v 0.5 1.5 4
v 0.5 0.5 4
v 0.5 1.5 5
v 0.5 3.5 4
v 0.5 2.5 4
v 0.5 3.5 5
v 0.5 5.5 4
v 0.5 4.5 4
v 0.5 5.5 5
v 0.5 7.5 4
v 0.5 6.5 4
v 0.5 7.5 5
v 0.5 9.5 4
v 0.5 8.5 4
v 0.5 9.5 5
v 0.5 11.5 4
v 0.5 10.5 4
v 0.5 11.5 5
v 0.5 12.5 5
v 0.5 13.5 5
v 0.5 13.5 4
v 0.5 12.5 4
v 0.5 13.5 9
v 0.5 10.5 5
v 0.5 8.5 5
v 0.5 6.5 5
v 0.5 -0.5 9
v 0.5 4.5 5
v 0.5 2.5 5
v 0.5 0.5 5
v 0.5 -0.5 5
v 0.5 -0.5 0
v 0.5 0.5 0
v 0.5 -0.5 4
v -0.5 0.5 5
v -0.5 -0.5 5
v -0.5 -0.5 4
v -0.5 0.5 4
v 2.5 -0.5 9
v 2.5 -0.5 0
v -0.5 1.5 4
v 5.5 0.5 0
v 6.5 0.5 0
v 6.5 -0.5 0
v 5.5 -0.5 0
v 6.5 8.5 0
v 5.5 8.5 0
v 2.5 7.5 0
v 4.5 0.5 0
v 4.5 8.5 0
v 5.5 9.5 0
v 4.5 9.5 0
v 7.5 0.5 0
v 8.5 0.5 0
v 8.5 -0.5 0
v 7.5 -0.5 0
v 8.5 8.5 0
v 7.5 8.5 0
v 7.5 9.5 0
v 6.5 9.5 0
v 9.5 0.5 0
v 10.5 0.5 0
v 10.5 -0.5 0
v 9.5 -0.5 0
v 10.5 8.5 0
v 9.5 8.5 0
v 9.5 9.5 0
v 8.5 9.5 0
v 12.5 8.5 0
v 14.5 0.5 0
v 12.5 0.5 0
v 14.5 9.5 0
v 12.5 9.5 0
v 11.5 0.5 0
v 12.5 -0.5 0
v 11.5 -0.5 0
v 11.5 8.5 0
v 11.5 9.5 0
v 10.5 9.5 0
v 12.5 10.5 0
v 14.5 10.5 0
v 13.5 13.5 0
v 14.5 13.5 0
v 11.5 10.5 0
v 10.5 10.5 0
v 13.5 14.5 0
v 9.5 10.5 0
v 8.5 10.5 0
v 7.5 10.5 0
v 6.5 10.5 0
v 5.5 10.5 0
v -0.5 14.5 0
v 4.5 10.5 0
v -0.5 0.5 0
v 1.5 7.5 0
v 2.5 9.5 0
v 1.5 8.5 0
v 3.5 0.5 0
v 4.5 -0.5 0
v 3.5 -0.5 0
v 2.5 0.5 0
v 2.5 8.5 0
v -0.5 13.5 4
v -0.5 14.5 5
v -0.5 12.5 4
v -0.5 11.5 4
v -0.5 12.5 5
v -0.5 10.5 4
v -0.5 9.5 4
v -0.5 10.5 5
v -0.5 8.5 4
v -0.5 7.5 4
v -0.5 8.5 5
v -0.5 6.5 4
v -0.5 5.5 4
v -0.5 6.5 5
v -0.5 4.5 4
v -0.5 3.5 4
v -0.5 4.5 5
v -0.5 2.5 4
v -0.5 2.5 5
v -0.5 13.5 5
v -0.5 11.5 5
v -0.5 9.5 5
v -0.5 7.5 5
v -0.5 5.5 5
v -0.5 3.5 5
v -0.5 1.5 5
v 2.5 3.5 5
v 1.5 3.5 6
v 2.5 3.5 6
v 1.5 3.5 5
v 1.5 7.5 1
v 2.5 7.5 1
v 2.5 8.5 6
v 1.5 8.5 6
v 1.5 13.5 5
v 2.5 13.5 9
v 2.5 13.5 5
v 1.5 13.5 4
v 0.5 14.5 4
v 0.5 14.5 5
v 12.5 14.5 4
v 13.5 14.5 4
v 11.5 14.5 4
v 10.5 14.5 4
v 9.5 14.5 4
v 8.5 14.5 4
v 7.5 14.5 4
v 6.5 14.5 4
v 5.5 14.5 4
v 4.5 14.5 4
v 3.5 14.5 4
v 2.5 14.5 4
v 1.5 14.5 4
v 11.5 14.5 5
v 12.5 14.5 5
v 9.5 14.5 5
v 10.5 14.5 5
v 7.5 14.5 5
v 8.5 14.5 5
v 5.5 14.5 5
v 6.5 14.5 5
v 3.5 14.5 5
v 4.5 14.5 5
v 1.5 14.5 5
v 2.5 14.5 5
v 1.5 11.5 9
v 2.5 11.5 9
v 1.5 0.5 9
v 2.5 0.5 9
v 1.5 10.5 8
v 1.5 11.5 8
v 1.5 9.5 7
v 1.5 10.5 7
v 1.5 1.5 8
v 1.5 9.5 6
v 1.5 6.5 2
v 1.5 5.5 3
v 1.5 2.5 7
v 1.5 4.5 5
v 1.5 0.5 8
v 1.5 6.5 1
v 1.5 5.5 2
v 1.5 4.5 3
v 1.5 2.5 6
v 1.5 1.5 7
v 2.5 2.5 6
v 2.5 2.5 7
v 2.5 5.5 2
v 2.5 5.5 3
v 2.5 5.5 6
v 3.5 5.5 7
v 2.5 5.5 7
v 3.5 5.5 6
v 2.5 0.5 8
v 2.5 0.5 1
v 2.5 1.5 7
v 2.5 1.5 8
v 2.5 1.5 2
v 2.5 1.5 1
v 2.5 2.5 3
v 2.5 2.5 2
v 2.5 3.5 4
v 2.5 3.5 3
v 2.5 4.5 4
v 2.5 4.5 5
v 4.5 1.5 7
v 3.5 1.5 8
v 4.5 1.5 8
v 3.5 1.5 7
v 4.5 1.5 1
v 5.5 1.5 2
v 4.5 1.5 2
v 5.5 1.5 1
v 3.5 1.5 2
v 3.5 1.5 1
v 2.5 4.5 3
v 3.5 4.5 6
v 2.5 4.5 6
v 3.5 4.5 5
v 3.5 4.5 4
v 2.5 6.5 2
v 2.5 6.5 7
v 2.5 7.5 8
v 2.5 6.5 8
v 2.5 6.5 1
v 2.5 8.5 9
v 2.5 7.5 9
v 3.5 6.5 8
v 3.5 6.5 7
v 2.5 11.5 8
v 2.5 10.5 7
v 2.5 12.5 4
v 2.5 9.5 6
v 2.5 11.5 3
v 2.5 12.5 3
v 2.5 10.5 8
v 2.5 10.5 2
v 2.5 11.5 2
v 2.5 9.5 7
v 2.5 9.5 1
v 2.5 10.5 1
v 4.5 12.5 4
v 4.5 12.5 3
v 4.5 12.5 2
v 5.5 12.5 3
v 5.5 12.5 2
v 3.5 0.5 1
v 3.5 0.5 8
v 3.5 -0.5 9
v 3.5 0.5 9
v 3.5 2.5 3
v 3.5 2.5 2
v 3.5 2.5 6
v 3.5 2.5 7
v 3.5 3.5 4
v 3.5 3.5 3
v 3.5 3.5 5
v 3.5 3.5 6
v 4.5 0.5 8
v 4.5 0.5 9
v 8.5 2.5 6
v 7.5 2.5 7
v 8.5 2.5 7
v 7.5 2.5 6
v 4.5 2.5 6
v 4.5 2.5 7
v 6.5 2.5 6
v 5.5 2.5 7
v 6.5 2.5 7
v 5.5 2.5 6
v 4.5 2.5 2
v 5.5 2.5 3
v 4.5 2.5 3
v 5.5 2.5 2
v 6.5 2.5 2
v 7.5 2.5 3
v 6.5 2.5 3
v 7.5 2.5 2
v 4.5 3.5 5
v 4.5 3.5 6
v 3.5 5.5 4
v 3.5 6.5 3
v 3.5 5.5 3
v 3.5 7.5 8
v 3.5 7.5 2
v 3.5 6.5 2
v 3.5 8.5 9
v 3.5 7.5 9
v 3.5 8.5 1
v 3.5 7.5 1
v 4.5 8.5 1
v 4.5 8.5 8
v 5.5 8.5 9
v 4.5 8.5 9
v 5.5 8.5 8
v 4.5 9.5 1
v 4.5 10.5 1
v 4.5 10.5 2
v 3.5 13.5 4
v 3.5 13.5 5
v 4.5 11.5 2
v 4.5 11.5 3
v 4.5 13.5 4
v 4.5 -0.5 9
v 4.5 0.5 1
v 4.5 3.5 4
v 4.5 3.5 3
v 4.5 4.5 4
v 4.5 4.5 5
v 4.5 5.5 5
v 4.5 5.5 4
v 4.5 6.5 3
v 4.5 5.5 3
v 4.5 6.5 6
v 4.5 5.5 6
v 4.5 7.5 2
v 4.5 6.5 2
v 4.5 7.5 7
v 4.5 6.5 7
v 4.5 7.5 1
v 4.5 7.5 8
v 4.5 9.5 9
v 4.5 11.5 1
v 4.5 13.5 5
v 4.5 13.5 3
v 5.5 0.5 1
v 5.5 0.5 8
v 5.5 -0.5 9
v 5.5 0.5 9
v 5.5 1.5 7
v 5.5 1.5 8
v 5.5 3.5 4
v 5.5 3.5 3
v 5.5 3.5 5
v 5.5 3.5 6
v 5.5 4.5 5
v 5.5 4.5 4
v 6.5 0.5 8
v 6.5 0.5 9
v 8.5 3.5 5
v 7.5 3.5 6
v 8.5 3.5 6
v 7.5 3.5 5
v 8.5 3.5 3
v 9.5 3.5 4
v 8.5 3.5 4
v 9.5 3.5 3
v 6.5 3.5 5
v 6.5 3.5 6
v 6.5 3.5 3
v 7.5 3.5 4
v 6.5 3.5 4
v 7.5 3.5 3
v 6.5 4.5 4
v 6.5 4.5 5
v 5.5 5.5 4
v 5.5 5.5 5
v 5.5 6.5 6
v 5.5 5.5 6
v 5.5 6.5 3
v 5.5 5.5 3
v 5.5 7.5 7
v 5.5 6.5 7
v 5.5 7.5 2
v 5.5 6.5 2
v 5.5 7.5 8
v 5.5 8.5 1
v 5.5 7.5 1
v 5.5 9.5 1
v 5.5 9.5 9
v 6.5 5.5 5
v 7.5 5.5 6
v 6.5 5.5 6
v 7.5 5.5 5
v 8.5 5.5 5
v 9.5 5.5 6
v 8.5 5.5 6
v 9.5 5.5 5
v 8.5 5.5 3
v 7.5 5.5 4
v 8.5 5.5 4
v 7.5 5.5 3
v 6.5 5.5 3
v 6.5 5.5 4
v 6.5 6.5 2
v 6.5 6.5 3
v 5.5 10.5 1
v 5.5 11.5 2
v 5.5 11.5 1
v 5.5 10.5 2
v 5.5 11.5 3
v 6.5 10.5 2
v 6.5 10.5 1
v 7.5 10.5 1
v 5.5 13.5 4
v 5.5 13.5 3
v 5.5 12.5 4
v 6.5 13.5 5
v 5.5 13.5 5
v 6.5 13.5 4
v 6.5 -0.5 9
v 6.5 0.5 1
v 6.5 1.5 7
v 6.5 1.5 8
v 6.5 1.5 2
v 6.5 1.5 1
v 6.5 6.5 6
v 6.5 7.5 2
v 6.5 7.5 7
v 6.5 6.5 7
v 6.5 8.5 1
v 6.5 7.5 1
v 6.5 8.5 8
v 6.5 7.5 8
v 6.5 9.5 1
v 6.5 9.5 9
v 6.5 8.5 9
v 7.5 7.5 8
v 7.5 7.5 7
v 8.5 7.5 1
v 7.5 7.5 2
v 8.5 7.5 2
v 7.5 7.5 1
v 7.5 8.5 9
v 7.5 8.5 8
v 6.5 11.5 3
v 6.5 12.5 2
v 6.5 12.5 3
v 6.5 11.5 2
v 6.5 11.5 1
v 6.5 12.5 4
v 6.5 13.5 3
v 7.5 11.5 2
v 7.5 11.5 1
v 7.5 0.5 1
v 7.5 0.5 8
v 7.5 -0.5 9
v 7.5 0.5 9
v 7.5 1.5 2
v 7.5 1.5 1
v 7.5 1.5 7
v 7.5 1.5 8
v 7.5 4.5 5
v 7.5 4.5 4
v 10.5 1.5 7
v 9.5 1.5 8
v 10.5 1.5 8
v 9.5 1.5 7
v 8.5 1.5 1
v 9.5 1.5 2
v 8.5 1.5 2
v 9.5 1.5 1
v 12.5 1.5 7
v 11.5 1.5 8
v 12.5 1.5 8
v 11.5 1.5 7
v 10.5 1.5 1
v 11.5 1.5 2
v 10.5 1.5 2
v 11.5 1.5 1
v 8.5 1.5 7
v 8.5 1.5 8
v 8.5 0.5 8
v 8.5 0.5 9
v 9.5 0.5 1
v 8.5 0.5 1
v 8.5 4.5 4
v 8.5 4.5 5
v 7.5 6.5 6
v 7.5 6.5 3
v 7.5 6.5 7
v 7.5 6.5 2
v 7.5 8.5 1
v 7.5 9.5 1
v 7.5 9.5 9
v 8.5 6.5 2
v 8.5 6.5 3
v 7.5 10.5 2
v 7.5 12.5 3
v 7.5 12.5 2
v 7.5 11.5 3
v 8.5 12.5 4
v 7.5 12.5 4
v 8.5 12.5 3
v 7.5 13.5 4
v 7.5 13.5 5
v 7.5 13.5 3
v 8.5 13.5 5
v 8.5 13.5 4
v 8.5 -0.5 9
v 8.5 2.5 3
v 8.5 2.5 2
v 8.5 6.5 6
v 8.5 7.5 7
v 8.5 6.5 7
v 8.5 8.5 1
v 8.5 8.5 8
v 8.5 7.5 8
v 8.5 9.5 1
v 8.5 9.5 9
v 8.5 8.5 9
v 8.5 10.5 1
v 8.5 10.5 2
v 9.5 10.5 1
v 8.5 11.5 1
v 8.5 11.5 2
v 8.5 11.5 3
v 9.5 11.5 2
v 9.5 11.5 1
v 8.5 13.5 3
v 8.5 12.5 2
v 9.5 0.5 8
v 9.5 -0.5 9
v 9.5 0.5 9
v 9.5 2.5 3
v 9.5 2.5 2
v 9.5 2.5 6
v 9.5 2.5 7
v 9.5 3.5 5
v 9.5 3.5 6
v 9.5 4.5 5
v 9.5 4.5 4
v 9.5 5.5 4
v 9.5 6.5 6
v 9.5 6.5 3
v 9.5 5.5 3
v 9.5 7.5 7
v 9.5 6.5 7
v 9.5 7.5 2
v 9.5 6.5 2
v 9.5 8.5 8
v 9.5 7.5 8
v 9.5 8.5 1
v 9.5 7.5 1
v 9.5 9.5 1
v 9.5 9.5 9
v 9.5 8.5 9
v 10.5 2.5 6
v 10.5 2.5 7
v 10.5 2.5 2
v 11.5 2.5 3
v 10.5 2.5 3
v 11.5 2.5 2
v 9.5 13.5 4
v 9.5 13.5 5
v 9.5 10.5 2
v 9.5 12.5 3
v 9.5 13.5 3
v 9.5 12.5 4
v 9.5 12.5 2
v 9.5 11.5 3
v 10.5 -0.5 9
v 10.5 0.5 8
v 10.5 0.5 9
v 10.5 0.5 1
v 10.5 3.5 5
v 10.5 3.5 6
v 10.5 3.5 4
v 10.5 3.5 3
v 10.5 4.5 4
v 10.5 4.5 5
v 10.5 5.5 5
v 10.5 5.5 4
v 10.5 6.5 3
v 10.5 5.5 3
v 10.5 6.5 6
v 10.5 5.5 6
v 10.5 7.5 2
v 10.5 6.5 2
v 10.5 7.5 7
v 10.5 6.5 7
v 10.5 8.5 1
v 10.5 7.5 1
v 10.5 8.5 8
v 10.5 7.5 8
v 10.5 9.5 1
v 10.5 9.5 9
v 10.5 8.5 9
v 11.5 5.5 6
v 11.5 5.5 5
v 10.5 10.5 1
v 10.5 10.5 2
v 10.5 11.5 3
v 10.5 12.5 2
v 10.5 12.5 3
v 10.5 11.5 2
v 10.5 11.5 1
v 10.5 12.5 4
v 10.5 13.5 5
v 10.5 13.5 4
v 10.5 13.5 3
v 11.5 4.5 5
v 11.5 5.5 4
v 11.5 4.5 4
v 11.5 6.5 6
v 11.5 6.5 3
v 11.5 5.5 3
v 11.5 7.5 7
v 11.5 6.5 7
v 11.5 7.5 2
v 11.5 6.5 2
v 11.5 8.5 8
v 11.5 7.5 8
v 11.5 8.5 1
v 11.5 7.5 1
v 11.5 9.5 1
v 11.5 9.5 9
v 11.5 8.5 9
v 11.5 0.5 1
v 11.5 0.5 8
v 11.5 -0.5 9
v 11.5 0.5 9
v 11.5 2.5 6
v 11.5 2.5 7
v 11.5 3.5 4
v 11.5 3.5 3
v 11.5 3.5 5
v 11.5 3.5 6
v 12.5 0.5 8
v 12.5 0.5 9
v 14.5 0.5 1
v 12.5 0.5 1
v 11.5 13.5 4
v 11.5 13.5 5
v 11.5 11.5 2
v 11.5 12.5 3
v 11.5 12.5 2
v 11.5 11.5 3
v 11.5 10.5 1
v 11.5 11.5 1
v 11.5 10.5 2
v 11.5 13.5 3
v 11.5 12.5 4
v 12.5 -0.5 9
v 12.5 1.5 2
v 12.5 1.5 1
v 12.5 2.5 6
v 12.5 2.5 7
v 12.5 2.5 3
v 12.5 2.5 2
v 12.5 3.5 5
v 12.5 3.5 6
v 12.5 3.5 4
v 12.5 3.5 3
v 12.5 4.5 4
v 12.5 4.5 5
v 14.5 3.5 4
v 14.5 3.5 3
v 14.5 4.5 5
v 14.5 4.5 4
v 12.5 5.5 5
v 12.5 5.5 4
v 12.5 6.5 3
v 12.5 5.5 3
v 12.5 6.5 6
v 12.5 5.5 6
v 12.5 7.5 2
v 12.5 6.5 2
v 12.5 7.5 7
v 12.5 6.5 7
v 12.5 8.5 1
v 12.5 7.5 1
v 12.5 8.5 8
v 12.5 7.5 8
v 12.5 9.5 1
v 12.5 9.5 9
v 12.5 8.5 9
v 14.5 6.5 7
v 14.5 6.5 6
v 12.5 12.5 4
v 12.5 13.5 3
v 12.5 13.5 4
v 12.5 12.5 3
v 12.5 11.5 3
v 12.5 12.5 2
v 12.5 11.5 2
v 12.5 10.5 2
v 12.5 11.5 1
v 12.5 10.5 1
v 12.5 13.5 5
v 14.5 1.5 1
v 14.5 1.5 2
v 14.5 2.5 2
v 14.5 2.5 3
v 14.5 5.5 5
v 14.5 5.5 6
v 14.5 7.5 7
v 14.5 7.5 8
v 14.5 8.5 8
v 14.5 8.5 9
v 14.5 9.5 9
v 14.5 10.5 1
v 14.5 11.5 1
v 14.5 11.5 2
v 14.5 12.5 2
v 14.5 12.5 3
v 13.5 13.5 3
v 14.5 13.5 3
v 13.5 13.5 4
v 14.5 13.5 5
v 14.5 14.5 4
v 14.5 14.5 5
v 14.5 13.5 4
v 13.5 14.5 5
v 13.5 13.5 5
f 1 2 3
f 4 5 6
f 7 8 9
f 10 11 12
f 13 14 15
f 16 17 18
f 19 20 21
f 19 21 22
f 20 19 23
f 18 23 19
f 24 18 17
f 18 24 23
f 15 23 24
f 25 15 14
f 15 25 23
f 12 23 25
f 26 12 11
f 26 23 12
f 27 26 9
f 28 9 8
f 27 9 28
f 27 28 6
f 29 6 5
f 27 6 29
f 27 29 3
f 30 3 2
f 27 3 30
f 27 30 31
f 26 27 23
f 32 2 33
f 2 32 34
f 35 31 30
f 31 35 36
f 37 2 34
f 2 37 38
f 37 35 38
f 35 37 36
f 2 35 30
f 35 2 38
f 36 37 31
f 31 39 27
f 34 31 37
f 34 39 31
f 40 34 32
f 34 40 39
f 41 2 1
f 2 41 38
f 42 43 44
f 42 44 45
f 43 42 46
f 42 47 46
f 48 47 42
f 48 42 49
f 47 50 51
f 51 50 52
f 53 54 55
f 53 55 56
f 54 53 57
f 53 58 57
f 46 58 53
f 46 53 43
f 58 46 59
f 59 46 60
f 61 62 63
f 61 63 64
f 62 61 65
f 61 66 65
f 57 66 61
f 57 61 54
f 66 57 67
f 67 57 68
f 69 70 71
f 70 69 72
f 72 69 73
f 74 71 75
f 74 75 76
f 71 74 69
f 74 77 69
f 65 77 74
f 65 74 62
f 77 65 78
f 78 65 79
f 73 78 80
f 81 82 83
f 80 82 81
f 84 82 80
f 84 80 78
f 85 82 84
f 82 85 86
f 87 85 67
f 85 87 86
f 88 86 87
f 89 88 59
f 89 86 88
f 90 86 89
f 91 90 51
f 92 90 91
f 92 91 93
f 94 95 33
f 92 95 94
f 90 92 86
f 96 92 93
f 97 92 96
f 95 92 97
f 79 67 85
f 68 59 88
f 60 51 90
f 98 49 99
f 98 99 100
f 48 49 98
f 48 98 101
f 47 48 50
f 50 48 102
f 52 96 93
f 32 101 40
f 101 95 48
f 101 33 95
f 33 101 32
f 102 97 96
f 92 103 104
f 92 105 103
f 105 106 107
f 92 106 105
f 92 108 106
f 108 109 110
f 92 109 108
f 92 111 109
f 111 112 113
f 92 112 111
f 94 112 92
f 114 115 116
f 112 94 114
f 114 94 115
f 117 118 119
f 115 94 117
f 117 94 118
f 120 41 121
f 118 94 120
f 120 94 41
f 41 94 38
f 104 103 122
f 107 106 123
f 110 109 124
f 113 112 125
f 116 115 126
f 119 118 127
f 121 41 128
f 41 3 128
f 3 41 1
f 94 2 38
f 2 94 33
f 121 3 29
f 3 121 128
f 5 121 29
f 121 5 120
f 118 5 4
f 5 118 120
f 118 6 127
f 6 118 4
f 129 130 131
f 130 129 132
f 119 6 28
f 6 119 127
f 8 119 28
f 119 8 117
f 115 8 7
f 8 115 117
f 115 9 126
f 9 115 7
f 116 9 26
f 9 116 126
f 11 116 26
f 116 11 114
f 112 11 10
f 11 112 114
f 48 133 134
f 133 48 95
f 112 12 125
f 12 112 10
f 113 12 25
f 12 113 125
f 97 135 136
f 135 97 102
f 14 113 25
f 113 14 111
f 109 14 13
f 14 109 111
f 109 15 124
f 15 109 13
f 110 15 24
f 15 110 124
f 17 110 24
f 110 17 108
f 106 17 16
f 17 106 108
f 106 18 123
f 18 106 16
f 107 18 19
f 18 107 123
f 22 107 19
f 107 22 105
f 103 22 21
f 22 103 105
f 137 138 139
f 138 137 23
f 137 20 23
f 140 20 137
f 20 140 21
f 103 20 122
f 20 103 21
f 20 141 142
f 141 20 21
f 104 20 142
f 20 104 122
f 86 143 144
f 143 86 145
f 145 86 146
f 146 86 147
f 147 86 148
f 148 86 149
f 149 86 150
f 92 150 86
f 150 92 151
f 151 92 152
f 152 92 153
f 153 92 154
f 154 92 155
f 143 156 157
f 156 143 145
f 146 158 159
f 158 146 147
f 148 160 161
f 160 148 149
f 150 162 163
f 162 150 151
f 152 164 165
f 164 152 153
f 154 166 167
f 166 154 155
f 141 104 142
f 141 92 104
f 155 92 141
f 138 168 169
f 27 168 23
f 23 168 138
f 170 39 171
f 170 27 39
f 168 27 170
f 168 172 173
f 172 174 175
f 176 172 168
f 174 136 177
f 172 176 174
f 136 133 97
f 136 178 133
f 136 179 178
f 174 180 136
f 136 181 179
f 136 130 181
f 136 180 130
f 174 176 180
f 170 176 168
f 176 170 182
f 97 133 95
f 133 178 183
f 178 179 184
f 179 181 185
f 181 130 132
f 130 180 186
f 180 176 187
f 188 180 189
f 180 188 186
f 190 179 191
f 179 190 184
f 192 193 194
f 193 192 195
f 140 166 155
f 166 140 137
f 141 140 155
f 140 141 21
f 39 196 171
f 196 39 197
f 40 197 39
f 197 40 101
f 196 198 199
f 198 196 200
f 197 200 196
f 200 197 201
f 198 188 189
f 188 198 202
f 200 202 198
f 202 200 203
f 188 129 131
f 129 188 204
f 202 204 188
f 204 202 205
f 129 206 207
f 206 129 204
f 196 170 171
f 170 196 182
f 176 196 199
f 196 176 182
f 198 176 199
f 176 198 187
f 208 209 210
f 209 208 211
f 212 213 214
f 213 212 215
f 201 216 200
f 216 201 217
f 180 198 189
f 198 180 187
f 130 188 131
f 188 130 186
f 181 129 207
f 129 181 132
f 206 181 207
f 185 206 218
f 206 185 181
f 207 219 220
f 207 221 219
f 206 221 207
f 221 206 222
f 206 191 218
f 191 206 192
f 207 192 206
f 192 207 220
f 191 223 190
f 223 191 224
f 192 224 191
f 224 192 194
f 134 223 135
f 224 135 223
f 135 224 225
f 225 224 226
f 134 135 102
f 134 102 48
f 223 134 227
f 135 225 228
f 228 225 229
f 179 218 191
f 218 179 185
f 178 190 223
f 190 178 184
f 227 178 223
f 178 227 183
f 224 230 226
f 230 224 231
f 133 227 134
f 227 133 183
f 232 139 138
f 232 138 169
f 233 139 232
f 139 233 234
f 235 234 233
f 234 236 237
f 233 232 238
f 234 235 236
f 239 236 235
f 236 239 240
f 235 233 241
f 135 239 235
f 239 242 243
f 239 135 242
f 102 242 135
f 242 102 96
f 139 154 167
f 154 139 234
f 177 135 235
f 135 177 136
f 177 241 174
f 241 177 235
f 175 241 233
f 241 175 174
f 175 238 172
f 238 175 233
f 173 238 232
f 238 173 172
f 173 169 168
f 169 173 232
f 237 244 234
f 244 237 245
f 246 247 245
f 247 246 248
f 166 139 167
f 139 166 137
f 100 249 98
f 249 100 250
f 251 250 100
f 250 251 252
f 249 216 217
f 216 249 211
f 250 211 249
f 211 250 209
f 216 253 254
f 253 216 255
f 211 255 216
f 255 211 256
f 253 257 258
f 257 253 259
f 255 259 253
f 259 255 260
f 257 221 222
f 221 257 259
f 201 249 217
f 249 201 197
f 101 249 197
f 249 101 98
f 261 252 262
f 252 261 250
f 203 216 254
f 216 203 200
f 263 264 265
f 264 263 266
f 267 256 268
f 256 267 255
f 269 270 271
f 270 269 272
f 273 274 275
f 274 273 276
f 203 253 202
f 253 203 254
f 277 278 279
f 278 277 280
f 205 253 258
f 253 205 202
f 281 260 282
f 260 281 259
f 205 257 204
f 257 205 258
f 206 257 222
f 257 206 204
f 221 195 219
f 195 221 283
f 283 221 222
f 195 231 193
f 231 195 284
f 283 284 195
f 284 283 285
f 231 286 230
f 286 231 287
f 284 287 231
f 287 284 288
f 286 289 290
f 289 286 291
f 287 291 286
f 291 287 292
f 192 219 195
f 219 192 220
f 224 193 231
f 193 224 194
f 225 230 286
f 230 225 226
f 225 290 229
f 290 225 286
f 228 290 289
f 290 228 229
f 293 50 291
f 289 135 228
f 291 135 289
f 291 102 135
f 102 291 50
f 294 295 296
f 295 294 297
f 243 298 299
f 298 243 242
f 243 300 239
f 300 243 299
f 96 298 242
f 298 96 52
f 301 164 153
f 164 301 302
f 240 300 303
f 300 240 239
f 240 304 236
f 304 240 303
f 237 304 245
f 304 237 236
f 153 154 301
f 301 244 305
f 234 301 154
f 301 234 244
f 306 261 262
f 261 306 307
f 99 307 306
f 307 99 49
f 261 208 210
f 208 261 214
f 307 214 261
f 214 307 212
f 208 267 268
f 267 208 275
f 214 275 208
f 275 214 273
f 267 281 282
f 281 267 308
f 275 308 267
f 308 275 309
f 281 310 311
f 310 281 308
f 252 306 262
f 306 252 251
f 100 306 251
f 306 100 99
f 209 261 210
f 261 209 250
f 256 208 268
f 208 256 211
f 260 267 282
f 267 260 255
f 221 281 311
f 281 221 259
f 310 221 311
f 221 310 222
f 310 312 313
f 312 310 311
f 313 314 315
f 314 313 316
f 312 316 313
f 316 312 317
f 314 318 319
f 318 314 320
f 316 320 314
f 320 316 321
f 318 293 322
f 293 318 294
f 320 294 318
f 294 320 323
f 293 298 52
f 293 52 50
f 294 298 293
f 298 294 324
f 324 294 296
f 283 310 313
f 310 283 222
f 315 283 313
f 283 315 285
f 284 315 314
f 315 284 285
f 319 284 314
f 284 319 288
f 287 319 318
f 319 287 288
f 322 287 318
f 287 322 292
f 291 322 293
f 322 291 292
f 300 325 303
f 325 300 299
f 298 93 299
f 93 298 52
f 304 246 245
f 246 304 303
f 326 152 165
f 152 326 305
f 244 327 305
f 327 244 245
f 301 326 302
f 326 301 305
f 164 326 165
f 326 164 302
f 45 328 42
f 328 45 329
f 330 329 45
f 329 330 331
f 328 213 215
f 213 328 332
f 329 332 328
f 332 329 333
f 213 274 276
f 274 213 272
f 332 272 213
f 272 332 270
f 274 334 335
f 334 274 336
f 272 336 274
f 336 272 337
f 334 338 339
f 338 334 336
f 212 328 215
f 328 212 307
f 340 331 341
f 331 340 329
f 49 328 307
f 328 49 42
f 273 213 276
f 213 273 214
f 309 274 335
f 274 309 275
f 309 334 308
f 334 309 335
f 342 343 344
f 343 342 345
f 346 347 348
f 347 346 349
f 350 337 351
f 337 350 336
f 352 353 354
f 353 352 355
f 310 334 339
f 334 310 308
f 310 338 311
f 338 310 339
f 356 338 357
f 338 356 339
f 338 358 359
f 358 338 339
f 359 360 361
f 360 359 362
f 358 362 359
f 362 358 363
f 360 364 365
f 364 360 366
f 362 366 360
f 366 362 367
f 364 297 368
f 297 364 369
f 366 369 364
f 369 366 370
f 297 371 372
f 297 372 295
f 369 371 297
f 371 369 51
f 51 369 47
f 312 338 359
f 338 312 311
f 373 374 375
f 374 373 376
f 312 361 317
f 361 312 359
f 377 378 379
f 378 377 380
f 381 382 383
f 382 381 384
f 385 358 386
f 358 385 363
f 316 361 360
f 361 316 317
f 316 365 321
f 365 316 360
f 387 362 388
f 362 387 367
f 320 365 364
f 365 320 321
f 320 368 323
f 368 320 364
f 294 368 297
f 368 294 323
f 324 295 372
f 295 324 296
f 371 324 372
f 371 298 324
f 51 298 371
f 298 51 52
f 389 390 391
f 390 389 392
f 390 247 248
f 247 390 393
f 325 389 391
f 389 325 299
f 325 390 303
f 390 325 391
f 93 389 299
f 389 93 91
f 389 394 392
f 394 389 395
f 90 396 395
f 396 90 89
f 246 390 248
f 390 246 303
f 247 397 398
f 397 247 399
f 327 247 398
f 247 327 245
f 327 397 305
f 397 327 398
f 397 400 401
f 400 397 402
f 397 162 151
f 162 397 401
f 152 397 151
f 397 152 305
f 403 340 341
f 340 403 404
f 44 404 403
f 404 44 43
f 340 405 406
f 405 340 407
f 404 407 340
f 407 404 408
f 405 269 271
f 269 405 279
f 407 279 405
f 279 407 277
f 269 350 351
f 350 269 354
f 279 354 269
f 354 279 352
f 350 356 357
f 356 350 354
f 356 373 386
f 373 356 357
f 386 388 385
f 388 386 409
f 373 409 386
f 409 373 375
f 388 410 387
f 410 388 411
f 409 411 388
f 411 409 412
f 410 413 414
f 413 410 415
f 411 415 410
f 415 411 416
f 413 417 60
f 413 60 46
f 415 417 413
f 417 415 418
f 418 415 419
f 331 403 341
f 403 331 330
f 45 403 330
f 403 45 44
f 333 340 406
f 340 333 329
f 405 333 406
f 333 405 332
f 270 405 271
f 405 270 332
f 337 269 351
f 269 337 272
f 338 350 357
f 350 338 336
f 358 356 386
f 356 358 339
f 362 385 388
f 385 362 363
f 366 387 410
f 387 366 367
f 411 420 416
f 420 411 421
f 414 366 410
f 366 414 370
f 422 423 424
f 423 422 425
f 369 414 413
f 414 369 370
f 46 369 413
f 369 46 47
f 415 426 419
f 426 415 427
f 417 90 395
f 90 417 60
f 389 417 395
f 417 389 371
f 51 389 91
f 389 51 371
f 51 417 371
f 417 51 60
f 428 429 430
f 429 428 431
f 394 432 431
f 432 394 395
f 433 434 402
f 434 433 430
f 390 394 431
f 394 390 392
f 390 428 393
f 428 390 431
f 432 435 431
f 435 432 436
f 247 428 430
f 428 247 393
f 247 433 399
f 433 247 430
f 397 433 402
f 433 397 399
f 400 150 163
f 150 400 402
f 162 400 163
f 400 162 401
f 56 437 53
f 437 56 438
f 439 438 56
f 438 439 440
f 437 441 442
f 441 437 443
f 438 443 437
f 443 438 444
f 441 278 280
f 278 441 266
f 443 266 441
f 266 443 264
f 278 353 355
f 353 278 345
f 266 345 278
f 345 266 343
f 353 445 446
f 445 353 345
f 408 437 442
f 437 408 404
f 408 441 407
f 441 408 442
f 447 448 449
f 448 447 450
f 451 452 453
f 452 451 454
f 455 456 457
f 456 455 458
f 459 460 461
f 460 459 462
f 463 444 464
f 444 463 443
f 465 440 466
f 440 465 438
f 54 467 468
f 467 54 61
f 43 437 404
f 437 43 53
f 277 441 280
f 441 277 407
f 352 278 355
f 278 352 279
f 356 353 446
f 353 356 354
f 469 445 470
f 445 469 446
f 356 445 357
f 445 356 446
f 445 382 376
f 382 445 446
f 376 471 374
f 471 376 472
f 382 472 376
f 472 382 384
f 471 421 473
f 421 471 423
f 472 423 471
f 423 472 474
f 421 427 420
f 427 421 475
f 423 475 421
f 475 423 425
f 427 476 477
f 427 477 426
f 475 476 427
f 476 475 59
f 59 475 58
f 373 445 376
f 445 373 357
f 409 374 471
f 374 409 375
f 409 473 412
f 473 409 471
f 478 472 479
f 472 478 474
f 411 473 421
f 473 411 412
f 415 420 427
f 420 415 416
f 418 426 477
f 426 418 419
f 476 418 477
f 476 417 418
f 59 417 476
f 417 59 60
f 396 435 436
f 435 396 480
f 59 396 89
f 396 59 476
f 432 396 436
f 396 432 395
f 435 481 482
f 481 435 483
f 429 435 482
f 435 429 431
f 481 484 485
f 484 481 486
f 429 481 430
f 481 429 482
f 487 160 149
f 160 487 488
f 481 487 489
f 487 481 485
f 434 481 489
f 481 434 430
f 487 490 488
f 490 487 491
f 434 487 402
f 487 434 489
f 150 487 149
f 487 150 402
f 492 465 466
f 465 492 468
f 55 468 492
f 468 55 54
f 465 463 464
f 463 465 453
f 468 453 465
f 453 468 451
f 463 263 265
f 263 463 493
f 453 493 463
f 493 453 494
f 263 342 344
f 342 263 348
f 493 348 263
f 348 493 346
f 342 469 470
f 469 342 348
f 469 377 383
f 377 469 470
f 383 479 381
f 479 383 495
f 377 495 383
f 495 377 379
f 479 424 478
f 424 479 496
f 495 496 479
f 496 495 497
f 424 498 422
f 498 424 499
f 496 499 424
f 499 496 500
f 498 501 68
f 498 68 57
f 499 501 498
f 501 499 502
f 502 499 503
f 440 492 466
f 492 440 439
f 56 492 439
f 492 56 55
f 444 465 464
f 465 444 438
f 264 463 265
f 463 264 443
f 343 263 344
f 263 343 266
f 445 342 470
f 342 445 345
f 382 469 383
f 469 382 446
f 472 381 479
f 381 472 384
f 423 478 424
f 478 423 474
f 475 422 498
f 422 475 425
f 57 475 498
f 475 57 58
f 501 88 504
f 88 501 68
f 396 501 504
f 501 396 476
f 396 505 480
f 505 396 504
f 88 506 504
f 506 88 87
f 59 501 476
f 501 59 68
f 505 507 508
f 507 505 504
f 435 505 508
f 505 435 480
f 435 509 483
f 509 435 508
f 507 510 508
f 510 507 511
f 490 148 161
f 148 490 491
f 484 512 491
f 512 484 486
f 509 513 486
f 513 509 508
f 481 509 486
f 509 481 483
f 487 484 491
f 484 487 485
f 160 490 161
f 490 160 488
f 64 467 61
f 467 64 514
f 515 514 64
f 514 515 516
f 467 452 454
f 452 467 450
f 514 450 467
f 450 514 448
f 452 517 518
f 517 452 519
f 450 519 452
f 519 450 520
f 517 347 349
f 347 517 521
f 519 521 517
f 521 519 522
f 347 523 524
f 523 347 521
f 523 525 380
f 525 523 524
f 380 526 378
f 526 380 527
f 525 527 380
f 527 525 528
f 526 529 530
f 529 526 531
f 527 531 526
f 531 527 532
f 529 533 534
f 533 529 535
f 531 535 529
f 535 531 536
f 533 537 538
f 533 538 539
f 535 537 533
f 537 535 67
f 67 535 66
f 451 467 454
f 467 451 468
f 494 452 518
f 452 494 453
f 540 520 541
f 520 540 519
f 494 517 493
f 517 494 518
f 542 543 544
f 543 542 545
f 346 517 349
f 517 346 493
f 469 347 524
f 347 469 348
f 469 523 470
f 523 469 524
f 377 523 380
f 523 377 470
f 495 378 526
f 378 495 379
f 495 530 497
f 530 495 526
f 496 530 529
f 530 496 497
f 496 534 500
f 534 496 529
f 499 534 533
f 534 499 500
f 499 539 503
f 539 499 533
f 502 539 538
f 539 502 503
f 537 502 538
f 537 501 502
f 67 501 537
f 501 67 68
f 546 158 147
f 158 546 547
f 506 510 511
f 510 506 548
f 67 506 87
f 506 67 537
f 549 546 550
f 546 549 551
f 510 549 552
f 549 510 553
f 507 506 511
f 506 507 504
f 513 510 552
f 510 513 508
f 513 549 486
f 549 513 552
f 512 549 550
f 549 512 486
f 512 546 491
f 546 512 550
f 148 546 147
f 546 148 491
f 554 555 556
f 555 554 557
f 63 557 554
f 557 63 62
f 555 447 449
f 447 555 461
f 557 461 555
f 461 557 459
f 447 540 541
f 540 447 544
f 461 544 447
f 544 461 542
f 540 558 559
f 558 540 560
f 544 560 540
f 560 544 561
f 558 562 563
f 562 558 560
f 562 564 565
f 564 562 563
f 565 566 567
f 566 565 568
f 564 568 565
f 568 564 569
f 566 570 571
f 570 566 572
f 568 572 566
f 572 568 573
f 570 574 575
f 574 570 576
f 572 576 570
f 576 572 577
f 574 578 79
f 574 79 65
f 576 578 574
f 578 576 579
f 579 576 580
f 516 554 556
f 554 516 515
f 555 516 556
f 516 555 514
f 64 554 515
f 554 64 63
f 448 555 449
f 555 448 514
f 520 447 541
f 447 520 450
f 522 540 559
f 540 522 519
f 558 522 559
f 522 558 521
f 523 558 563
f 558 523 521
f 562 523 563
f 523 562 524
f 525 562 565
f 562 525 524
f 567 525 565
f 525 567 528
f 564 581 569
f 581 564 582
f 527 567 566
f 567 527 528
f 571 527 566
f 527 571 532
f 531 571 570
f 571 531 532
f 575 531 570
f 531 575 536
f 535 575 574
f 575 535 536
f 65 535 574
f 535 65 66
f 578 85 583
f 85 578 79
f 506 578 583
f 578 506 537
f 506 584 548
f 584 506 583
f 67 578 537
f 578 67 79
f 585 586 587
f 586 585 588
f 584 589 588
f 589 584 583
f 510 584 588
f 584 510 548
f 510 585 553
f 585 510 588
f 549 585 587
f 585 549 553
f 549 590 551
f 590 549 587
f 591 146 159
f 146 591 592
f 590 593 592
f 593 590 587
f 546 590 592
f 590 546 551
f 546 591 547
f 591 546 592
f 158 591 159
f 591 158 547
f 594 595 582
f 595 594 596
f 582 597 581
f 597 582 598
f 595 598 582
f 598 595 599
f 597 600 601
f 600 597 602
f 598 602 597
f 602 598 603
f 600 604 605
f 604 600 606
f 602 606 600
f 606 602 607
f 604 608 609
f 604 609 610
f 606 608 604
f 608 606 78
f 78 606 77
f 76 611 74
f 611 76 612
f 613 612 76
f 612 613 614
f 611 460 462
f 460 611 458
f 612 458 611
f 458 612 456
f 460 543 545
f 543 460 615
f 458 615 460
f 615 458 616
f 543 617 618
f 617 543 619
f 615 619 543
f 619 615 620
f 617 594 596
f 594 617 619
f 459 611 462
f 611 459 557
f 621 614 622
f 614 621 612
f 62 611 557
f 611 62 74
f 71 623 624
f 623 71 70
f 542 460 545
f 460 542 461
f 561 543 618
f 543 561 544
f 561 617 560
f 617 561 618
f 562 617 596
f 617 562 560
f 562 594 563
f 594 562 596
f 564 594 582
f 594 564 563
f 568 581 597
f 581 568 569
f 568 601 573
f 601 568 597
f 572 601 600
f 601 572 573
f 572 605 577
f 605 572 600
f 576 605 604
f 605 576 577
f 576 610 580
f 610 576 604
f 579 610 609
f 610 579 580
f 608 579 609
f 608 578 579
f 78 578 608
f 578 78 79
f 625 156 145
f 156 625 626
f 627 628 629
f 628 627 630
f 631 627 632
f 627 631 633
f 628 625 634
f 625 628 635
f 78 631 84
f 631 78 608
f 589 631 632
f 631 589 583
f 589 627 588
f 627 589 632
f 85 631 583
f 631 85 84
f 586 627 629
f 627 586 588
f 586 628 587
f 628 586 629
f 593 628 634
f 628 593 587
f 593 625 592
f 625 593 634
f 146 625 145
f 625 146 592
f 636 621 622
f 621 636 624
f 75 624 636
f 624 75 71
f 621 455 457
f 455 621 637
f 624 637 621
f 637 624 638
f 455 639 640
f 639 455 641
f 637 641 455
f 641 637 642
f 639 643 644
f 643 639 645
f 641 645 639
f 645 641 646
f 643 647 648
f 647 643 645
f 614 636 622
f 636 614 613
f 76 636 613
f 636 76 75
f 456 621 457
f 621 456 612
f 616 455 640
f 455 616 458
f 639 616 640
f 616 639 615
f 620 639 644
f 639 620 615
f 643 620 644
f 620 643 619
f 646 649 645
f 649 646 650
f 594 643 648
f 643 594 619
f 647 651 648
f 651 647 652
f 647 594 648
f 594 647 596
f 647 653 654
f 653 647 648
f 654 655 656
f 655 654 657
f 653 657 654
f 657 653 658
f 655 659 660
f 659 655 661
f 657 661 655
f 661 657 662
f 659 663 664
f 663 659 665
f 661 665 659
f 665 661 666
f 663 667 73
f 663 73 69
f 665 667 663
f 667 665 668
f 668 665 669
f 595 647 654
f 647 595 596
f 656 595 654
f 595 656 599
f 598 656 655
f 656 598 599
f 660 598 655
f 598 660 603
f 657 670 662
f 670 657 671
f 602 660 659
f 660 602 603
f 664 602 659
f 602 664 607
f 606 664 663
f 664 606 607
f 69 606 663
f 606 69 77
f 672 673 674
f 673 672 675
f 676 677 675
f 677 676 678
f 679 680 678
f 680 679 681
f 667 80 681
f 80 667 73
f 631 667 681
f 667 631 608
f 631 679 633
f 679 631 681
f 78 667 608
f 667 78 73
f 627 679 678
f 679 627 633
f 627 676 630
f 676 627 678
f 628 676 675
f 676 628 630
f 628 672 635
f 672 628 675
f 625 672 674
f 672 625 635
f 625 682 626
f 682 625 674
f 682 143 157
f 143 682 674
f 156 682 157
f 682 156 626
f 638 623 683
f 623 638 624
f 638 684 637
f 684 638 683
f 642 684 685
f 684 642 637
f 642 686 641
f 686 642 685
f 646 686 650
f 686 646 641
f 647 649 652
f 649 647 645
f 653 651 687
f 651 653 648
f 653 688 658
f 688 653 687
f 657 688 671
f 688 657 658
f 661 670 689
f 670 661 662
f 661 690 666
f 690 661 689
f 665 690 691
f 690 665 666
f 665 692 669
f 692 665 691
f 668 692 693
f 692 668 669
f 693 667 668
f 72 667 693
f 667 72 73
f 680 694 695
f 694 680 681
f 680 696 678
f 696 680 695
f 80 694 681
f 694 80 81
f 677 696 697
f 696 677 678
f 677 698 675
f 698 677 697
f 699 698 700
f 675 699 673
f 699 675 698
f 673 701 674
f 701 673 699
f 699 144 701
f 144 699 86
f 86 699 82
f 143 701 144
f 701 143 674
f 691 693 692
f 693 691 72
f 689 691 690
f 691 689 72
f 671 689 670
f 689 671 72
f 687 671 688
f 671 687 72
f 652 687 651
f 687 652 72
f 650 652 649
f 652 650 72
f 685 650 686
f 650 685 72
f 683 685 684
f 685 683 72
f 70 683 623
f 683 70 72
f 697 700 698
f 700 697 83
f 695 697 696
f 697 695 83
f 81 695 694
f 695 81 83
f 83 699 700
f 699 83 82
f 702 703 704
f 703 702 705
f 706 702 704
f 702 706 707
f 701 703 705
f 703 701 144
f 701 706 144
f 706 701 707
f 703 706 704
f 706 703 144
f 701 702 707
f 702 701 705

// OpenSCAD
union() {
    translate([0, 0, 4.5]) color([1, 0, 0]) cube([1, 1, 1], center=true);
    translate([0, 1, 2.0]) cube([1, 1, 4], center=true);
    translate([0, 2, 2.5]) cube([1, 1, 5], center=true);
    translate([0, 3, 2.0]) cube([1, 1, 4], center=true);
    translate([0, 4, 2.5]) cube([1, 1, 5], center=true);
    translate([0, 5, 2.0]) cube([1, 1, 4], center=true);
    translate([0, 6, 2.5]) cube([1, 1, 5], center=true);
    translate([0, 7, 2.0]) cube([1, 1, 4], center=true);
    translate([0, 8, 2.5]) cube([1, 1, 5], center=true);
    translate([0, 9, 2.0]) cube([1, 1, 4], center=true);
    translate([0, 10, 2.5]) cube([1, 1, 5], center=true);
    translate([0, 11, 2.0]) cube([1, 1, 4], center=true);
    translate([0, 12, 2.5]) cube([1, 1, 5], center=true);
    translate([0, 13, 2.0]) cube([1, 1, 4], center=true);
    translate([0, 14, 2.5]) cube([1, 1, 5], center=true);
    translate([1, 0, 4.5]) cube([1, 1, 9], center=true);
    translate([1, 1, 4.5]) cube([1, 1, 9], center=true);
    translate([1, 2, 4.5]) cube([1, 1, 9], center=true);
    translate([1, 3, 4.5]) cube([1, 1, 9], center=true);
    translate([1, 4, 4.5]) cube([1, 1, 9], center=true);
    translate([1, 5, 4.5]) cube([1, 1, 9], center=true);
    translate([1, 6, 4.5]) cube([1, 1, 9], center=true);
    translate([1, 7, 4.5]) cube([1, 1, 9], center=true);
    translate([1, 8, 4.5]) cube([1, 1, 9], center=true);
    translate([1, 9, 4.5]) cube([1, 1, 9], center=true);
    translate([1, 10, 4.5]) cube([1, 1, 9], center=true);
    translate([1, 11, 4.5]) cube([1, 1, 9], center=true);
    translate([1, 12, 4.5]) cube([1, 1, 9], center=true);
    translate([1, 13, 4.5]) cube([1, 1, 9], center=true);
    translate([1, 14, 2.0]) cube([1, 1, 4], center=true);
    translate([2, 0, 4.5]) cube([1, 1, 9], center=true);
    translate([2, 1, 4.0]) cube([1, 1, 8], center=true);
    translate([2, 2, 3.5]) cube([1, 1, 7], center=true);
    translate([2, 3, 3.0]) cube([1, 1, 6], center=true);
    translate([2, 4, 2.5]) cube([1, 1, 5], center=true);
    translate([2, 5, 1.5]) cube([1, 1, 3], center=true);
    translate([2, 6, 1.0]) cube([1, 1, 2], center=true);
    translate([2, 7, 0.5]) cube([1, 1, 1], center=true);
    translate([2, 9, 3.0]) cube([1, 1, 6], center=true);
    translate([2, 10, 3.5]) cube([1, 1, 7], center=true);
    translate([2, 11, 4.0]) cube([1, 1, 8], center=true);
    translate([2, 12, 4.5]) cube([1, 1, 9], center=true);
    translate([2, 13, 4.5]) cube([1, 1, 9], center=true);
    translate([2, 14, 2.5]) cube([1, 1, 5], center=true);
    translate([3, 1, 0.5]) cube([1, 1, 1], center=true);
    translate([3, 2, 1.0]) cube([1, 1, 2], center=true);
    translate([3, 3, 1.5]) cube([1, 1, 3], center=true);
    translate([3, 4, 2.0]) cube([1, 1, 4], center=true);
    translate([3, 5, 3.0]) cube([1, 1, 6], center=true);
    translate([3, 6, 3.5]) cube([1, 1, 7], center=true);
    translate([3, 7, 4.0]) cube([1, 1, 8], center=true);
    translate([3, 8, 4.5]) cube([1, 1, 9], center=true);
    translate([3, 10, 0.5]) cube([1, 1, 1], center=true);
    translate([3, 11, 1.0]) cube([1, 1, 2], center=true);
    translate([3, 12, 1.5]) cube([1, 1, 3], center=true);
    translate([3, 13, 2.0]) cube([1, 1, 4], center=true);
    translate([3, 14, 2.0]) cube([1, 1, 4], center=true);
    translate([4, 0, 4.5]) cube([1, 1, 9], center=true);
    translate([4, 1, 4.0]) cube([1, 1, 8], center=true);
    translate([4, 2, 3.5]) cube([1, 1, 7], center=true);
    translate([4, 3, 3.0]) cube([1, 1, 6], center=true);
    translate([4, 4, 2.5]) cube([1, 1, 5], center=true);
    translate([4, 5, 2.0]) cube([1, 1, 4], center=true);
    translate([4, 6, 1.5]) cube([1, 1, 3], center=true);
    translate([4, 7, 1.0]) cube([1, 1, 2], center=true);
    translate([4, 8, 0.5]) cube([1, 1, 1], center=true);
    translate([4, 10, 0.5]) cube([1, 1, 1], center=true);
    translate([4, 11, 1.0]) cube([1, 1, 2], center=true);
    translate([4, 12, 1.5]) cube([1, 1, 3], center=true);
    translate([4, 13, 2.0]) cube([1, 1, 4], center=true);
    translate([4, 14, 2.5]) cube([1, 1, 5], center=true);
    translate([5, 1, 0.5]) cube([1, 1, 1], center=true);
    translate([5, 2, 1.0]) cube([1, 1, 2], center=true);
    translate([5, 3, 1.5]) cube([1, 1, 3], center=true);
    translate([5, 4, 2.0]) cube([1, 1, 4], center=true);
    translate([5, 5, 2.5]) cube([1, 1, 5], center=true);
    translate([5, 6, 3.0]) cube([1, 1, 6], center=true);
    translate([5, 7, 3.5]) cube([1, 1, 7], center=true);
    translate([5, 8, 4.0]) cube([1, 1, 8], center=true);
    translate([5, 9, 4.5]) cube([1, 1, 9], center=true);
    translate([5, 11, 0.5]) cube([1, 1, 1], center=true);
    translate([5, 12, 1.0]) cube([1, 1, 2], center=true);
    translate([5, 13, 1.5]) cube([1, 1, 3], center=true);
    translate([5, 14, 2.0]) cube([1, 1, 4], center=true);
    translate([6, 0, 4.5]) cube([1, 1, 9], center=true);
    translate([6, 1, 4.0]) cube([1, 1, 8], center=true);
    translate([6, 2, 3.5]) cube([1, 1, 7], center=true);
    translate([6, 3, 3.0]) cube([1, 1, 6], center=true);
    translate([6, 4, 2.5]) cube([1, 1, 5], center=true);
    translate([6, 5, 2.0]) cube([1, 1, 4], center=true);
    translate([6, 6, 1.5]) cube([1, 1, 3], center=true);
    translate([6, 7, 1.0]) cube([1, 1, 2], center=true);
    translate([6, 8, 0.5]) cube([1, 1, 1], center=true);
    translate([6, 10, 0.5]) cube([1, 1, 1], center=true);
    translate([6, 11, 1.0]) cube([1, 1, 2], center=true);
    translate([6, 12, 1.5]) cube([1, 1, 3], center=true);
    translate([6, 13, 2.0]) cube([1, 1, 4], center=true);
    translate([6, 14, 2.5]) cube([1, 1, 5], center=true);
    translate([7, 1, 0.5]) cube([1, 1, 1], center=true);
    translate([7, 2, 1.0]) cube([1, 1, 2], center=true);
    translate([7, 3, 1.5]) cube([1, 1, 3], center=true);
    translate([7, 4, 2.0]) cube([1, 1, 4], center=true);
    translate([7, 5, 2.5]) cube([1, 1, 5], center=true);
    translate([7, 6, 3.0]) cube([1, 1, 6], center=true);
    translate([7, 7, 3.5]) cube([1, 1, 7], center=true);
    translate([7, 8, 4.0]) cube([1, 1, 8], center=true);
    translate([7, 9, 4.5]) cube([1, 1, 9], center=true);
    translate([7, 11, 0.5]) cube([1, 1, 1], center=true);
    translate([7, 12, 1.0]) cube([1, 1, 2], center=true);
    translate([7, 13, 1.5]) cube([1, 1, 3], center=true);
    translate([7, 14, 2.0]) cube([1, 1, 4], center=true);
    translate([8, 0, 4.5]) cube([1, 1, 9], center=true);
    translate([8, 1, 4.0]) cube([1, 1, 8], center=true);
    translate([8, 2, 3.5]) cube([1, 1, 7], center=true);
    translate([8, 3, 3.0]) cube([1, 1, 6], center=true);
    translate([8, 4, 2.5]) cube([1, 1, 5], center=true);
    translate([8, 5, 2.0]) cube([1, 1, 4], center=true);
    translate([8, 6, 1.5]) cube([1, 1, 3], center=true);
    translate([8, 7, 1.0]) cube([1, 1, 2], center=true);
    translate([8, 8, 0.5]) cube([1, 1, 1], center=true);
    translate([8, 10, 0.5]) cube([1, 1, 1], center=true);
    translate([8, 11, 1.0]) cube([1, 1, 2], center=true);
    translate([8, 12, 1.5]) cube([1, 1, 3], center=true);
    translate([8, 13, 2.0]) cube([1, 1, 4], center=true);
    translate([8, 14, 2.5]) cube([1, 1, 5], center=true);
    translate([9, 1, 0.5]) cube([1, 1, 1], center=true);
    translate([9, 2, 1.0]) cube([1, 1, 2], center=true);
    translate([9, 3, 1.5]) cube([1, 1, 3], center=true);
    translate([9, 4, 2.0]) cube([1, 1, 4], center=true);
    translate([9, 5, 2.5]) cube([1, 1, 5], center=true);
    translate([9, 6, 3.0]) cube([1, 1, 6], center=true);
    translate([9, 7, 3.5]) cube([1, 1, 7], center=true);
    translate([9, 8, 4.0]) cube([1, 1, 8], center=true);
    translate([9, 9, 4.5]) cube([1, 1, 9], center=true);
    translate([9, 11, 0.5]) cube([1, 1, 1], center=true);
    translate([9, 12, 1.0]) cube([1, 1, 2], center=true);
    translate([9, 13, 1.5]) cube([1, 1, 3], center=true);
    translate([9, 14, 2.0]) cube([1, 1, 4], center=true);
    translate([10, 0, 4.5]) cube([1, 1, 9], center=true);
    translate([10, 1, 4.0]) cube([1, 1, 8], center=true);
    translate([10, 2, 3.5]) cube([1, 1, 7], center=true);
    translate([10, 3, 3.0]) cube([1, 1, 6], center=true);
    translate([10, 4, 2.5]) cube([1, 1, 5], center=true);
    translate([10, 5, 2.0]) cube([1, 1, 4], center=true);
    translate([10, 6, 1.5]) cube([1, 1, 3], center=true);
    translate([10, 7, 1.0]) cube([1, 1, 2], center=true);
    translate([10, 8, 0.5]) cube([1, 1, 1], center=true);
    translate([10, 10, 0.5]) cube([1, 1, 1], center=true);
    translate([10, 11, 1.0]) cube([1, 1, 2], center=true);
    translate([10, 12, 1.5]) cube([1, 1, 3], center=true);
    translate([10, 13, 2.0]) cube([1, 1, 4], center=true);
    translate([10, 14, 2.5]) cube([1, 1, 5], center=true);
    translate([11, 1, 0.5]) cube([1, 1, 1], center=true);
    translate([11, 2, 1.0]) cube([1, 1, 2], center=true);
    translate([11, 3, 1.5]) cube([1, 1, 3], center=true);
    translate([11, 4, 2.0]) cube([1, 1, 4], center=true);
    translate([11, 5, 2.5]) cube([1, 1, 5], center=true);
    translate([11, 6, 3.0]) cube([1, 1, 6], center=true);
    translate([11, 7, 3.5]) cube([1, 1, 7], center=true);
    translate([11, 8, 4.0]) cube([1, 1, 8], center=true);
    translate([11, 9, 4.5]) cube([1, 1, 9], center=true);
    translate([11, 11, 0.5]) cube([1, 1, 1], center=true);
    translate([11, 12, 1.0]) cube([1, 1, 2], center=true);
    translate([11, 13, 1.5]) cube([1, 1, 3], center=true);
    translate([11, 14, 2.0]) cube([1, 1, 4], center=true);
    translate([12, 0, 4.5]) cube([1, 1, 9], center=true);
    translate([12, 1, 4.0]) cube([1, 1, 8], center=true);
    translate([12, 2, 3.5]) cube([1, 1, 7], center=true);
    translate([12, 3, 3.0]) cube([1, 1, 6], center=true);
    translate([12, 4, 2.5]) cube([1, 1, 5], center=true);
    translate([12, 5, 2.0]) cube([1, 1, 4], center=true);
    translate([12, 6, 1.5]) cube([1, 1, 3], center=true);
    translate([12, 7, 1.0]) cube([1, 1, 2], center=true);
    translate([12, 8, 0.5]) cube([1, 1, 1], center=true);
    translate([12, 10, 0.5]) cube([1, 1, 1], center=true);
    translate([12, 11, 1.0]) cube([1, 1, 2], center=true);
    translate([12, 12, 1.5]) cube([1, 1, 3], center=true);
    translate([12, 13, 2.0]) cube([1, 1, 4], center=true);
    translate([12, 14, 2.5]) cube([1, 1, 5], center=true);
    translate([13, 1, 0.5]) cube([1, 1, 1], center=true);
    translate([13, 2, 1.0]) cube([1, 1, 2], center=true);
    translate([13, 3, 1.5]) cube([1, 1, 3], center=true);
    translate([13, 4, 2.0]) cube([1, 1, 4], center=true);
    translate([13, 5, 2.5]) cube([1, 1, 5], center=true);
    translate([13, 6, 3.0]) cube([1, 1, 6], center=true);
    translate([13, 7, 3.5]) cube([1, 1, 7], center=true);
    translate([13, 8, 4.0]) cube([1, 1, 8], center=true);
    translate([13, 9, 4.5]) cube([1, 1, 9], center=true);
    translate([13, 11, 0.5]) cube([1, 1, 1], center=true);
    translate([13, 12, 1.0]) cube([1, 1, 2], center=true);
    translate([13, 13, 1.5]) cube([1, 1, 3], center=true);
    translate([13, 14, 2.0]) cube([1, 1, 4], center=true);
    translate([14, 1, 0.5]) cube([1, 1, 1], center=true);
    translate([14, 2, 1.0]) cube([1, 1, 2], center=true);
    translate([14, 3, 1.5]) cube([1, 1, 3], center=true);
    translate([14, 4, 2.0]) cube([1, 1, 4], center=true);
    translate([14, 5, 2.5]) cube([1, 1, 5], center=true);
    translate([14, 6, 3.0]) cube([1, 1, 6], center=true);
    translate([14, 7, 3.5]) cube([1, 1, 7], center=true);
    translate([14, 8, 4.0]) cube([1, 1, 8], center=true);
    translate([14, 9, 4.5]) cube([1, 1, 9], center=true);
    translate([14, 11, 0.5]) cube([1, 1, 1], center=true);
    translate([14, 12, 1.0]) cube([1, 1, 2], center=true);
    translate([14, 13, 1.5]) cube([1, 1, 3], center=true);
    translate([14, 14, 4.5]) color([0, 0, 1]) cube([1, 1, 1], center=true);
}
